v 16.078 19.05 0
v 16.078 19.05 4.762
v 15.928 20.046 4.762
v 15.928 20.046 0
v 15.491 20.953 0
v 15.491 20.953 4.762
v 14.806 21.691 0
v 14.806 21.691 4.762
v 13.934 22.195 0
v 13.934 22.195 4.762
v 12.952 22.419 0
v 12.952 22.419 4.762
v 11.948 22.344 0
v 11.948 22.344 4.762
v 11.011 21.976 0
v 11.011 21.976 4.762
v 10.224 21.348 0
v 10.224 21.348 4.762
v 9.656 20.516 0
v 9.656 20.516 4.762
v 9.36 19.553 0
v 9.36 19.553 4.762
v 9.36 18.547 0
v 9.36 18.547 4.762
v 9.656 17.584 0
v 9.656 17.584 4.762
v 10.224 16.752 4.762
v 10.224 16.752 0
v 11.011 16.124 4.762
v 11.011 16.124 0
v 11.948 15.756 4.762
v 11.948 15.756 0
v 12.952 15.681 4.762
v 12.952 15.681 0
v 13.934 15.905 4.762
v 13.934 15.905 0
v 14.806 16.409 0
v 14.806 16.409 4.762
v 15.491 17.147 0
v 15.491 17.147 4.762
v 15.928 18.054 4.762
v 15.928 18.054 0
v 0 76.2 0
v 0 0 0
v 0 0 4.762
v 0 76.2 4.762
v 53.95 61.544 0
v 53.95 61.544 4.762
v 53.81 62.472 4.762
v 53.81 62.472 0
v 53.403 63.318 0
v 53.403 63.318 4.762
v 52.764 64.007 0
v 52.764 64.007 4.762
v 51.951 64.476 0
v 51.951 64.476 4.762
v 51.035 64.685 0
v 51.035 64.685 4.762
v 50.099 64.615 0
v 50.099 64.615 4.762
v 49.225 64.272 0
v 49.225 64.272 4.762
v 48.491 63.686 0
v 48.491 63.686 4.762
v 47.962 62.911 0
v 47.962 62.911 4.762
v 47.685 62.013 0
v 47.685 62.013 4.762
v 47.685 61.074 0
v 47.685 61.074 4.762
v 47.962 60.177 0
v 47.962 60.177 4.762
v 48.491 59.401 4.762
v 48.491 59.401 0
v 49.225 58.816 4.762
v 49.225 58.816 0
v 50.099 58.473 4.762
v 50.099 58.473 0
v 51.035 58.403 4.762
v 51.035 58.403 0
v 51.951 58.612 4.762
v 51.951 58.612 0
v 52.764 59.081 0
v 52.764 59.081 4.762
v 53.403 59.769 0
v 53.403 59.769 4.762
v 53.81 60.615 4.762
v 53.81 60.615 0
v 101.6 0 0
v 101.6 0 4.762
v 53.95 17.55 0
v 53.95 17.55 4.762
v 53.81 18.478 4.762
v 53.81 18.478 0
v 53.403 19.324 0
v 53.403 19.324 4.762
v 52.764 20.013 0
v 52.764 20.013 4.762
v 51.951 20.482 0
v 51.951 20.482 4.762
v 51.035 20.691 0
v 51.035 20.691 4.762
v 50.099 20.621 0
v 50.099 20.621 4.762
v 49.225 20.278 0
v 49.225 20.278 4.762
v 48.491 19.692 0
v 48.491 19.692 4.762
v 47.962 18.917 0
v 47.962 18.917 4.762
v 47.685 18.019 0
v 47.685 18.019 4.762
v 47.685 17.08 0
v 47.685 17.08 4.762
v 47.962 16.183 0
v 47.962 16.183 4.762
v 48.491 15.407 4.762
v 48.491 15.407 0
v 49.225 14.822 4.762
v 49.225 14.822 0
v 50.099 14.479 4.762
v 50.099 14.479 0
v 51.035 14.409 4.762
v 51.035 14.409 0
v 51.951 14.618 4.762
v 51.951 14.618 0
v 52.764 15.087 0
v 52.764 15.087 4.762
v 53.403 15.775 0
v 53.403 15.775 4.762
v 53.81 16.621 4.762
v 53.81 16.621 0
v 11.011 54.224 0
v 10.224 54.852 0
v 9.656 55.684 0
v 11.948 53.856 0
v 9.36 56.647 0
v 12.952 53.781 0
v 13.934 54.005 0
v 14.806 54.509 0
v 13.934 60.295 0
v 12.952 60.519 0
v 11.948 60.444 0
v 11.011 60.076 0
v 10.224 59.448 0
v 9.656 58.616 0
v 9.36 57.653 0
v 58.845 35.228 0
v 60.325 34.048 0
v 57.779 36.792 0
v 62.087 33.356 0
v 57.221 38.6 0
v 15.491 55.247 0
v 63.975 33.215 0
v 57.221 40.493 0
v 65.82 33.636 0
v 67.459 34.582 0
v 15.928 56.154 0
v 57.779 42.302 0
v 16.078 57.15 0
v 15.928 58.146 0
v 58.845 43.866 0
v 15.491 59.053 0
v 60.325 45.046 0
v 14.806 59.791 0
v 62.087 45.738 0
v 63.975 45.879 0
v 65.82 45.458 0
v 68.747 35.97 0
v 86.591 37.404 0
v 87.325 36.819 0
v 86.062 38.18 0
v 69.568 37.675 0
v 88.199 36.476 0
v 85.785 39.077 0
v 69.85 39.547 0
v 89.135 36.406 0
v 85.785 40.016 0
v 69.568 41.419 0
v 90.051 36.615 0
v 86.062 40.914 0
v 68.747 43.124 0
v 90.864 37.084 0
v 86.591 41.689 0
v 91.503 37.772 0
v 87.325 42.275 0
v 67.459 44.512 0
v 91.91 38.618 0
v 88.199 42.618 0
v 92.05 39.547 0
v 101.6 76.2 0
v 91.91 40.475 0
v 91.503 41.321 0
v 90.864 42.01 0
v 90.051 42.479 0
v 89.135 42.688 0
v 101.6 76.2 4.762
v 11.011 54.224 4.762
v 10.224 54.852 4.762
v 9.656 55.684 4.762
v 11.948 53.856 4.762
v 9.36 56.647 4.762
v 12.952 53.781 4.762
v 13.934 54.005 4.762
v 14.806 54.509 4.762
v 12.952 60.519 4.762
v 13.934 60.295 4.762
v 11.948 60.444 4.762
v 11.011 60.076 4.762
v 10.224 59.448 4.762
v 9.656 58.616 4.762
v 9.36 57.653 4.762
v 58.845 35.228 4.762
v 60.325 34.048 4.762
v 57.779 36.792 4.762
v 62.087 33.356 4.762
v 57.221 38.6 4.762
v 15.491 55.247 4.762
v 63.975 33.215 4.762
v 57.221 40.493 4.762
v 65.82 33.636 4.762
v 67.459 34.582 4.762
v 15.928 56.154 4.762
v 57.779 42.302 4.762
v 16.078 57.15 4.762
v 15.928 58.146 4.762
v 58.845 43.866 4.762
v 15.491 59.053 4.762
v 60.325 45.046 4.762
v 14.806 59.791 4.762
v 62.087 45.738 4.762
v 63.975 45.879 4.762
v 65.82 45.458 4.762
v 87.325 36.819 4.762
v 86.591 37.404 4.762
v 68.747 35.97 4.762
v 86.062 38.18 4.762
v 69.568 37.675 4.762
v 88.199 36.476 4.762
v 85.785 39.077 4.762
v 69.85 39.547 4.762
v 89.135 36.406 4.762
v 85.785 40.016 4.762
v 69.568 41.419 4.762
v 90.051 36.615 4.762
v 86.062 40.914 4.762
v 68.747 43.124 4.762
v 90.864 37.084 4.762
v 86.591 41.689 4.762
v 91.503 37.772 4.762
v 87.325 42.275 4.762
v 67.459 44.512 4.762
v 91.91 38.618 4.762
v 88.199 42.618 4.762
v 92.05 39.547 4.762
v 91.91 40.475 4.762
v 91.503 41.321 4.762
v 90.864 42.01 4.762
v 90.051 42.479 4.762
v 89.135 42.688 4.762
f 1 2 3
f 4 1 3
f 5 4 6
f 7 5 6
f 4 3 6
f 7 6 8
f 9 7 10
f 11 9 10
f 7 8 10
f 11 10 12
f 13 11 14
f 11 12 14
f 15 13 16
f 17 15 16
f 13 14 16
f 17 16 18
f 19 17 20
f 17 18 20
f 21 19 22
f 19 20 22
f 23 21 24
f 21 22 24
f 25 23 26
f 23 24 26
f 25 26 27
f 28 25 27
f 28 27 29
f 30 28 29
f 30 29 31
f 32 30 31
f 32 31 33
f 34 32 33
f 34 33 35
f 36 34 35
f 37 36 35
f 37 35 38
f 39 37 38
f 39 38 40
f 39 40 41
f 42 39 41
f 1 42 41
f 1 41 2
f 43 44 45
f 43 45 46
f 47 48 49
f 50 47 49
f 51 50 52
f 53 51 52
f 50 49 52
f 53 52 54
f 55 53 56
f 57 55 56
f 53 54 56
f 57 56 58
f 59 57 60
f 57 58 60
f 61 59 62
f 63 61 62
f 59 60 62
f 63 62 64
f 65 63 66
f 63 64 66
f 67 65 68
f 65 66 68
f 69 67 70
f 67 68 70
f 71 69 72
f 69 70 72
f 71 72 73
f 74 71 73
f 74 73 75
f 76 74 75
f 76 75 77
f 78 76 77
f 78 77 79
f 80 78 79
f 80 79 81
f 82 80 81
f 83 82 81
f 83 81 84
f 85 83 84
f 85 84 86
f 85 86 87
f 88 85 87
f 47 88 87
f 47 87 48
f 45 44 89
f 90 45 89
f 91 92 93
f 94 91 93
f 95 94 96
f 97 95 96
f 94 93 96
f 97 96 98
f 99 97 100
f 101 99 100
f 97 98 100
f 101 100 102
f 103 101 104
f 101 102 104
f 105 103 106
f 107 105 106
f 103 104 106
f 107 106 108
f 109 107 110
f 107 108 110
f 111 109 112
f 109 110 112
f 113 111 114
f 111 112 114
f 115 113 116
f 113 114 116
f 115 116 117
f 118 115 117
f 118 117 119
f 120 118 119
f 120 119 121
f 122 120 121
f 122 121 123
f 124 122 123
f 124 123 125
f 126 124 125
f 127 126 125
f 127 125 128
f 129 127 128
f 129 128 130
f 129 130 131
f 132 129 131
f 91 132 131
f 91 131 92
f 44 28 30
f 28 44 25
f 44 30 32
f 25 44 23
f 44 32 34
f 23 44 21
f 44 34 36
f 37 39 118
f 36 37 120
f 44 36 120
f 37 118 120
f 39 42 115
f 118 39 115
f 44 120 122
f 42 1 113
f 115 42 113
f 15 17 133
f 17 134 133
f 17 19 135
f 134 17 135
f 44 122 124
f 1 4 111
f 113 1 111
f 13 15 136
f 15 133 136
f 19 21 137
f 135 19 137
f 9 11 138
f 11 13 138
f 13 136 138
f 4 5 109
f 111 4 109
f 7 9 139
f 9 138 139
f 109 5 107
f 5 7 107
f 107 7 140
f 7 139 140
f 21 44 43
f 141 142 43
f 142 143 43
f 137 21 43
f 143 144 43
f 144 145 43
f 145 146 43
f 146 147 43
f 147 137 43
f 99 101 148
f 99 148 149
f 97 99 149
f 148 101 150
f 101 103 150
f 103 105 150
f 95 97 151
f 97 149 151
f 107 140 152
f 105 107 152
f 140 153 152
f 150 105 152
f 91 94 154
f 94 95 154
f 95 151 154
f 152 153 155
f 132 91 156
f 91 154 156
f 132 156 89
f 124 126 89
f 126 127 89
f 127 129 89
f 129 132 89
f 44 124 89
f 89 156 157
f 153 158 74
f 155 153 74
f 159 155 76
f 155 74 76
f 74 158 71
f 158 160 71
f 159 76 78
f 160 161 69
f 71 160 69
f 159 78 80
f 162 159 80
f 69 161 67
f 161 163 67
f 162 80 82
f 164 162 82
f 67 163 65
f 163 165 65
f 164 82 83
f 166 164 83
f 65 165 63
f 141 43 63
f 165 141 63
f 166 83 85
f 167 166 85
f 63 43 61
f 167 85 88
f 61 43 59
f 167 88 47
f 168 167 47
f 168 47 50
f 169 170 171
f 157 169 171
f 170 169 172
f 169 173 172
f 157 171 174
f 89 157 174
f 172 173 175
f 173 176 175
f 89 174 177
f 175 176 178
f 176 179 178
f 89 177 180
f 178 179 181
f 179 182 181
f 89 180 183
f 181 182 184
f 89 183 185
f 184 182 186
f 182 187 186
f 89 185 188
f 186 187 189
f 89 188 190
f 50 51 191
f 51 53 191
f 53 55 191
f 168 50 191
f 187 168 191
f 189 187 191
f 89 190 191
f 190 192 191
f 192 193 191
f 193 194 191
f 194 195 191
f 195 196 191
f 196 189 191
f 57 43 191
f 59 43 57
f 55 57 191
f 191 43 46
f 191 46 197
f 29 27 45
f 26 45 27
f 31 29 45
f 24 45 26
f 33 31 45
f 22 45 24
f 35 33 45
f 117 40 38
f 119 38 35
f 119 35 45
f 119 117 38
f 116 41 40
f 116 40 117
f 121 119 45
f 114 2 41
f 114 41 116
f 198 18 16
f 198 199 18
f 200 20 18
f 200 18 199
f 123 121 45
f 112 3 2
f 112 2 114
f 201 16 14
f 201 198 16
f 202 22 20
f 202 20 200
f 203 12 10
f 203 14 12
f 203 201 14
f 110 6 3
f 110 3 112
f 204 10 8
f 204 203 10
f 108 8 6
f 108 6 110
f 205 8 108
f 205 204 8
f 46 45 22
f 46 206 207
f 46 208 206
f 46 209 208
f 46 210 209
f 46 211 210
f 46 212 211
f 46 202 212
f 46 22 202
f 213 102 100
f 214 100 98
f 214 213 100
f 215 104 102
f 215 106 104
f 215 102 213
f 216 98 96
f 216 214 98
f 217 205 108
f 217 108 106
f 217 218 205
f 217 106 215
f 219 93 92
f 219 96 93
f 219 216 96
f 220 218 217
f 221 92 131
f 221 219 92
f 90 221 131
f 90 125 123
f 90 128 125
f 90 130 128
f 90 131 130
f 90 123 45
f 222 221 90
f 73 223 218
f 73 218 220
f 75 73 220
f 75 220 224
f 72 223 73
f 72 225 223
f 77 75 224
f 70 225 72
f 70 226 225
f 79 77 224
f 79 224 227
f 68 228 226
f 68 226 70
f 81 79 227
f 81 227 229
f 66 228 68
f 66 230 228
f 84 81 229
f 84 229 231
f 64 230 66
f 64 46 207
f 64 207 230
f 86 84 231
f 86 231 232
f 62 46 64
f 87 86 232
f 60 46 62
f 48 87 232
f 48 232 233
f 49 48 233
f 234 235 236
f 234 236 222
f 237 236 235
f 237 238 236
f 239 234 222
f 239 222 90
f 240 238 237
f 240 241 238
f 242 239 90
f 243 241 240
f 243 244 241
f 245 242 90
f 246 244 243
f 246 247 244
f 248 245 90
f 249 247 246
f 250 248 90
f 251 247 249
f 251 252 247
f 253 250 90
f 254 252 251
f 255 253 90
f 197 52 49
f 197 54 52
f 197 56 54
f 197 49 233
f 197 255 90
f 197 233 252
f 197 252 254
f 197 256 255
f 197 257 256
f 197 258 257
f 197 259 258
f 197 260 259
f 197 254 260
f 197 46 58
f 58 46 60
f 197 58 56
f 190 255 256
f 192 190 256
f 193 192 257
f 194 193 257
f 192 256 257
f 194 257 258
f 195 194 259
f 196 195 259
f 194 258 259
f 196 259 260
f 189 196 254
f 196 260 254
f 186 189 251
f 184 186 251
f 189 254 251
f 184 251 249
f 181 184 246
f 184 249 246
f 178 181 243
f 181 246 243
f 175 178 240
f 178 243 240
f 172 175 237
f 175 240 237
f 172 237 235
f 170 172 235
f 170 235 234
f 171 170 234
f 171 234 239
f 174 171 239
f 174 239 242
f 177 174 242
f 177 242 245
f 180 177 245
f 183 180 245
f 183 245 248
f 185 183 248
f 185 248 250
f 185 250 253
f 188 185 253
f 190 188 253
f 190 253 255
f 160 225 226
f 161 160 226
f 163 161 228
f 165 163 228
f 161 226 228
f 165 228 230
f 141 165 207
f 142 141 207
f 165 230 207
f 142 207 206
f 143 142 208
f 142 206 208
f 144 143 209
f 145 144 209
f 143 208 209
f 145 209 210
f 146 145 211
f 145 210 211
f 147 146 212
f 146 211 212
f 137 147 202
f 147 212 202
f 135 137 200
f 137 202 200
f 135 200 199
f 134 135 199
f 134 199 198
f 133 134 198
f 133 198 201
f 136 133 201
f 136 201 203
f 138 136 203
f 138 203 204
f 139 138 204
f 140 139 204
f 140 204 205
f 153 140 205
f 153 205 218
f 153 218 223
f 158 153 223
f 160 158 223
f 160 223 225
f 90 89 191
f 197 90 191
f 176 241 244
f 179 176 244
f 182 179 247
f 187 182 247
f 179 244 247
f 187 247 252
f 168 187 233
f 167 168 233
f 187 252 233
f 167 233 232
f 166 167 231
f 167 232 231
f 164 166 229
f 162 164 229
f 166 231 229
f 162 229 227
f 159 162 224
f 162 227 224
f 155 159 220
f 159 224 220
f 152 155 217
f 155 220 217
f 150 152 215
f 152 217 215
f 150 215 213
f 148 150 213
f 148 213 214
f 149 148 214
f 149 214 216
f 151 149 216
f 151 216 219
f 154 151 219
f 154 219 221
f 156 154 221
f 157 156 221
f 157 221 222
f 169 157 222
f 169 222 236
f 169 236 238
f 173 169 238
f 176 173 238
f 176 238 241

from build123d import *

# Parameters (mm, degrees)
SKETCH1_W           = 101.6
SKETCH1_H           = 76.2
BOSS_EXTRUDE1_DEPTH = 4.7625
SKETCH2_R           = 3.3782
CUT_EXTRUDE1_DEPTH  = 5.7625
SKETCH3_R           = 6.35
SKETCH3_R_2         = 3.1500064
CUT_EXTRUDE2_DEPTH  = 5.7625


with BuildPart() as part:
    # Sketch1 → Boss-Extrude1 (new body)
    with BuildSketch(Plane.XY):
        with Locations((50.8, 38.1)):
            Rectangle(SKETCH1_W, SKETCH1_H)
    extrude(amount=BOSS_EXTRUDE1_DEPTH)

    # Sketch2 → Cut-Extrude1 (cut, through all)
    with BuildSketch(Plane.XY.offset(4.7625)):
        with Locations((12.7, 57.15)):
            Circle(SKETCH2_R)
        with Locations((12.7, 19.05)):
            Circle(SKETCH2_R)
    extrude(amount=-CUT_EXTRUDE1_DEPTH, mode=Mode.SUBTRACT)

    # Sketch3 → Cut-Extrude2 (cut, through all)
    with BuildSketch(Plane.XY.offset(4.7625)):
        with Locations((63.5, 39.546877005)):
            Circle(SKETCH3_R)
        with Locations((50.8, 61.543922261)):
            Circle(SKETCH3_R_2)
        with Locations((88.9, 39.546877005)):
            Circle(SKETCH3_R_2)
        with Locations((50.8, 17.549831749)):
            Circle(SKETCH3_R_2)
    extrude(amount=-CUT_EXTRUDE2_DEPTH, mode=Mode.SUBTRACT)


solid = part.part
